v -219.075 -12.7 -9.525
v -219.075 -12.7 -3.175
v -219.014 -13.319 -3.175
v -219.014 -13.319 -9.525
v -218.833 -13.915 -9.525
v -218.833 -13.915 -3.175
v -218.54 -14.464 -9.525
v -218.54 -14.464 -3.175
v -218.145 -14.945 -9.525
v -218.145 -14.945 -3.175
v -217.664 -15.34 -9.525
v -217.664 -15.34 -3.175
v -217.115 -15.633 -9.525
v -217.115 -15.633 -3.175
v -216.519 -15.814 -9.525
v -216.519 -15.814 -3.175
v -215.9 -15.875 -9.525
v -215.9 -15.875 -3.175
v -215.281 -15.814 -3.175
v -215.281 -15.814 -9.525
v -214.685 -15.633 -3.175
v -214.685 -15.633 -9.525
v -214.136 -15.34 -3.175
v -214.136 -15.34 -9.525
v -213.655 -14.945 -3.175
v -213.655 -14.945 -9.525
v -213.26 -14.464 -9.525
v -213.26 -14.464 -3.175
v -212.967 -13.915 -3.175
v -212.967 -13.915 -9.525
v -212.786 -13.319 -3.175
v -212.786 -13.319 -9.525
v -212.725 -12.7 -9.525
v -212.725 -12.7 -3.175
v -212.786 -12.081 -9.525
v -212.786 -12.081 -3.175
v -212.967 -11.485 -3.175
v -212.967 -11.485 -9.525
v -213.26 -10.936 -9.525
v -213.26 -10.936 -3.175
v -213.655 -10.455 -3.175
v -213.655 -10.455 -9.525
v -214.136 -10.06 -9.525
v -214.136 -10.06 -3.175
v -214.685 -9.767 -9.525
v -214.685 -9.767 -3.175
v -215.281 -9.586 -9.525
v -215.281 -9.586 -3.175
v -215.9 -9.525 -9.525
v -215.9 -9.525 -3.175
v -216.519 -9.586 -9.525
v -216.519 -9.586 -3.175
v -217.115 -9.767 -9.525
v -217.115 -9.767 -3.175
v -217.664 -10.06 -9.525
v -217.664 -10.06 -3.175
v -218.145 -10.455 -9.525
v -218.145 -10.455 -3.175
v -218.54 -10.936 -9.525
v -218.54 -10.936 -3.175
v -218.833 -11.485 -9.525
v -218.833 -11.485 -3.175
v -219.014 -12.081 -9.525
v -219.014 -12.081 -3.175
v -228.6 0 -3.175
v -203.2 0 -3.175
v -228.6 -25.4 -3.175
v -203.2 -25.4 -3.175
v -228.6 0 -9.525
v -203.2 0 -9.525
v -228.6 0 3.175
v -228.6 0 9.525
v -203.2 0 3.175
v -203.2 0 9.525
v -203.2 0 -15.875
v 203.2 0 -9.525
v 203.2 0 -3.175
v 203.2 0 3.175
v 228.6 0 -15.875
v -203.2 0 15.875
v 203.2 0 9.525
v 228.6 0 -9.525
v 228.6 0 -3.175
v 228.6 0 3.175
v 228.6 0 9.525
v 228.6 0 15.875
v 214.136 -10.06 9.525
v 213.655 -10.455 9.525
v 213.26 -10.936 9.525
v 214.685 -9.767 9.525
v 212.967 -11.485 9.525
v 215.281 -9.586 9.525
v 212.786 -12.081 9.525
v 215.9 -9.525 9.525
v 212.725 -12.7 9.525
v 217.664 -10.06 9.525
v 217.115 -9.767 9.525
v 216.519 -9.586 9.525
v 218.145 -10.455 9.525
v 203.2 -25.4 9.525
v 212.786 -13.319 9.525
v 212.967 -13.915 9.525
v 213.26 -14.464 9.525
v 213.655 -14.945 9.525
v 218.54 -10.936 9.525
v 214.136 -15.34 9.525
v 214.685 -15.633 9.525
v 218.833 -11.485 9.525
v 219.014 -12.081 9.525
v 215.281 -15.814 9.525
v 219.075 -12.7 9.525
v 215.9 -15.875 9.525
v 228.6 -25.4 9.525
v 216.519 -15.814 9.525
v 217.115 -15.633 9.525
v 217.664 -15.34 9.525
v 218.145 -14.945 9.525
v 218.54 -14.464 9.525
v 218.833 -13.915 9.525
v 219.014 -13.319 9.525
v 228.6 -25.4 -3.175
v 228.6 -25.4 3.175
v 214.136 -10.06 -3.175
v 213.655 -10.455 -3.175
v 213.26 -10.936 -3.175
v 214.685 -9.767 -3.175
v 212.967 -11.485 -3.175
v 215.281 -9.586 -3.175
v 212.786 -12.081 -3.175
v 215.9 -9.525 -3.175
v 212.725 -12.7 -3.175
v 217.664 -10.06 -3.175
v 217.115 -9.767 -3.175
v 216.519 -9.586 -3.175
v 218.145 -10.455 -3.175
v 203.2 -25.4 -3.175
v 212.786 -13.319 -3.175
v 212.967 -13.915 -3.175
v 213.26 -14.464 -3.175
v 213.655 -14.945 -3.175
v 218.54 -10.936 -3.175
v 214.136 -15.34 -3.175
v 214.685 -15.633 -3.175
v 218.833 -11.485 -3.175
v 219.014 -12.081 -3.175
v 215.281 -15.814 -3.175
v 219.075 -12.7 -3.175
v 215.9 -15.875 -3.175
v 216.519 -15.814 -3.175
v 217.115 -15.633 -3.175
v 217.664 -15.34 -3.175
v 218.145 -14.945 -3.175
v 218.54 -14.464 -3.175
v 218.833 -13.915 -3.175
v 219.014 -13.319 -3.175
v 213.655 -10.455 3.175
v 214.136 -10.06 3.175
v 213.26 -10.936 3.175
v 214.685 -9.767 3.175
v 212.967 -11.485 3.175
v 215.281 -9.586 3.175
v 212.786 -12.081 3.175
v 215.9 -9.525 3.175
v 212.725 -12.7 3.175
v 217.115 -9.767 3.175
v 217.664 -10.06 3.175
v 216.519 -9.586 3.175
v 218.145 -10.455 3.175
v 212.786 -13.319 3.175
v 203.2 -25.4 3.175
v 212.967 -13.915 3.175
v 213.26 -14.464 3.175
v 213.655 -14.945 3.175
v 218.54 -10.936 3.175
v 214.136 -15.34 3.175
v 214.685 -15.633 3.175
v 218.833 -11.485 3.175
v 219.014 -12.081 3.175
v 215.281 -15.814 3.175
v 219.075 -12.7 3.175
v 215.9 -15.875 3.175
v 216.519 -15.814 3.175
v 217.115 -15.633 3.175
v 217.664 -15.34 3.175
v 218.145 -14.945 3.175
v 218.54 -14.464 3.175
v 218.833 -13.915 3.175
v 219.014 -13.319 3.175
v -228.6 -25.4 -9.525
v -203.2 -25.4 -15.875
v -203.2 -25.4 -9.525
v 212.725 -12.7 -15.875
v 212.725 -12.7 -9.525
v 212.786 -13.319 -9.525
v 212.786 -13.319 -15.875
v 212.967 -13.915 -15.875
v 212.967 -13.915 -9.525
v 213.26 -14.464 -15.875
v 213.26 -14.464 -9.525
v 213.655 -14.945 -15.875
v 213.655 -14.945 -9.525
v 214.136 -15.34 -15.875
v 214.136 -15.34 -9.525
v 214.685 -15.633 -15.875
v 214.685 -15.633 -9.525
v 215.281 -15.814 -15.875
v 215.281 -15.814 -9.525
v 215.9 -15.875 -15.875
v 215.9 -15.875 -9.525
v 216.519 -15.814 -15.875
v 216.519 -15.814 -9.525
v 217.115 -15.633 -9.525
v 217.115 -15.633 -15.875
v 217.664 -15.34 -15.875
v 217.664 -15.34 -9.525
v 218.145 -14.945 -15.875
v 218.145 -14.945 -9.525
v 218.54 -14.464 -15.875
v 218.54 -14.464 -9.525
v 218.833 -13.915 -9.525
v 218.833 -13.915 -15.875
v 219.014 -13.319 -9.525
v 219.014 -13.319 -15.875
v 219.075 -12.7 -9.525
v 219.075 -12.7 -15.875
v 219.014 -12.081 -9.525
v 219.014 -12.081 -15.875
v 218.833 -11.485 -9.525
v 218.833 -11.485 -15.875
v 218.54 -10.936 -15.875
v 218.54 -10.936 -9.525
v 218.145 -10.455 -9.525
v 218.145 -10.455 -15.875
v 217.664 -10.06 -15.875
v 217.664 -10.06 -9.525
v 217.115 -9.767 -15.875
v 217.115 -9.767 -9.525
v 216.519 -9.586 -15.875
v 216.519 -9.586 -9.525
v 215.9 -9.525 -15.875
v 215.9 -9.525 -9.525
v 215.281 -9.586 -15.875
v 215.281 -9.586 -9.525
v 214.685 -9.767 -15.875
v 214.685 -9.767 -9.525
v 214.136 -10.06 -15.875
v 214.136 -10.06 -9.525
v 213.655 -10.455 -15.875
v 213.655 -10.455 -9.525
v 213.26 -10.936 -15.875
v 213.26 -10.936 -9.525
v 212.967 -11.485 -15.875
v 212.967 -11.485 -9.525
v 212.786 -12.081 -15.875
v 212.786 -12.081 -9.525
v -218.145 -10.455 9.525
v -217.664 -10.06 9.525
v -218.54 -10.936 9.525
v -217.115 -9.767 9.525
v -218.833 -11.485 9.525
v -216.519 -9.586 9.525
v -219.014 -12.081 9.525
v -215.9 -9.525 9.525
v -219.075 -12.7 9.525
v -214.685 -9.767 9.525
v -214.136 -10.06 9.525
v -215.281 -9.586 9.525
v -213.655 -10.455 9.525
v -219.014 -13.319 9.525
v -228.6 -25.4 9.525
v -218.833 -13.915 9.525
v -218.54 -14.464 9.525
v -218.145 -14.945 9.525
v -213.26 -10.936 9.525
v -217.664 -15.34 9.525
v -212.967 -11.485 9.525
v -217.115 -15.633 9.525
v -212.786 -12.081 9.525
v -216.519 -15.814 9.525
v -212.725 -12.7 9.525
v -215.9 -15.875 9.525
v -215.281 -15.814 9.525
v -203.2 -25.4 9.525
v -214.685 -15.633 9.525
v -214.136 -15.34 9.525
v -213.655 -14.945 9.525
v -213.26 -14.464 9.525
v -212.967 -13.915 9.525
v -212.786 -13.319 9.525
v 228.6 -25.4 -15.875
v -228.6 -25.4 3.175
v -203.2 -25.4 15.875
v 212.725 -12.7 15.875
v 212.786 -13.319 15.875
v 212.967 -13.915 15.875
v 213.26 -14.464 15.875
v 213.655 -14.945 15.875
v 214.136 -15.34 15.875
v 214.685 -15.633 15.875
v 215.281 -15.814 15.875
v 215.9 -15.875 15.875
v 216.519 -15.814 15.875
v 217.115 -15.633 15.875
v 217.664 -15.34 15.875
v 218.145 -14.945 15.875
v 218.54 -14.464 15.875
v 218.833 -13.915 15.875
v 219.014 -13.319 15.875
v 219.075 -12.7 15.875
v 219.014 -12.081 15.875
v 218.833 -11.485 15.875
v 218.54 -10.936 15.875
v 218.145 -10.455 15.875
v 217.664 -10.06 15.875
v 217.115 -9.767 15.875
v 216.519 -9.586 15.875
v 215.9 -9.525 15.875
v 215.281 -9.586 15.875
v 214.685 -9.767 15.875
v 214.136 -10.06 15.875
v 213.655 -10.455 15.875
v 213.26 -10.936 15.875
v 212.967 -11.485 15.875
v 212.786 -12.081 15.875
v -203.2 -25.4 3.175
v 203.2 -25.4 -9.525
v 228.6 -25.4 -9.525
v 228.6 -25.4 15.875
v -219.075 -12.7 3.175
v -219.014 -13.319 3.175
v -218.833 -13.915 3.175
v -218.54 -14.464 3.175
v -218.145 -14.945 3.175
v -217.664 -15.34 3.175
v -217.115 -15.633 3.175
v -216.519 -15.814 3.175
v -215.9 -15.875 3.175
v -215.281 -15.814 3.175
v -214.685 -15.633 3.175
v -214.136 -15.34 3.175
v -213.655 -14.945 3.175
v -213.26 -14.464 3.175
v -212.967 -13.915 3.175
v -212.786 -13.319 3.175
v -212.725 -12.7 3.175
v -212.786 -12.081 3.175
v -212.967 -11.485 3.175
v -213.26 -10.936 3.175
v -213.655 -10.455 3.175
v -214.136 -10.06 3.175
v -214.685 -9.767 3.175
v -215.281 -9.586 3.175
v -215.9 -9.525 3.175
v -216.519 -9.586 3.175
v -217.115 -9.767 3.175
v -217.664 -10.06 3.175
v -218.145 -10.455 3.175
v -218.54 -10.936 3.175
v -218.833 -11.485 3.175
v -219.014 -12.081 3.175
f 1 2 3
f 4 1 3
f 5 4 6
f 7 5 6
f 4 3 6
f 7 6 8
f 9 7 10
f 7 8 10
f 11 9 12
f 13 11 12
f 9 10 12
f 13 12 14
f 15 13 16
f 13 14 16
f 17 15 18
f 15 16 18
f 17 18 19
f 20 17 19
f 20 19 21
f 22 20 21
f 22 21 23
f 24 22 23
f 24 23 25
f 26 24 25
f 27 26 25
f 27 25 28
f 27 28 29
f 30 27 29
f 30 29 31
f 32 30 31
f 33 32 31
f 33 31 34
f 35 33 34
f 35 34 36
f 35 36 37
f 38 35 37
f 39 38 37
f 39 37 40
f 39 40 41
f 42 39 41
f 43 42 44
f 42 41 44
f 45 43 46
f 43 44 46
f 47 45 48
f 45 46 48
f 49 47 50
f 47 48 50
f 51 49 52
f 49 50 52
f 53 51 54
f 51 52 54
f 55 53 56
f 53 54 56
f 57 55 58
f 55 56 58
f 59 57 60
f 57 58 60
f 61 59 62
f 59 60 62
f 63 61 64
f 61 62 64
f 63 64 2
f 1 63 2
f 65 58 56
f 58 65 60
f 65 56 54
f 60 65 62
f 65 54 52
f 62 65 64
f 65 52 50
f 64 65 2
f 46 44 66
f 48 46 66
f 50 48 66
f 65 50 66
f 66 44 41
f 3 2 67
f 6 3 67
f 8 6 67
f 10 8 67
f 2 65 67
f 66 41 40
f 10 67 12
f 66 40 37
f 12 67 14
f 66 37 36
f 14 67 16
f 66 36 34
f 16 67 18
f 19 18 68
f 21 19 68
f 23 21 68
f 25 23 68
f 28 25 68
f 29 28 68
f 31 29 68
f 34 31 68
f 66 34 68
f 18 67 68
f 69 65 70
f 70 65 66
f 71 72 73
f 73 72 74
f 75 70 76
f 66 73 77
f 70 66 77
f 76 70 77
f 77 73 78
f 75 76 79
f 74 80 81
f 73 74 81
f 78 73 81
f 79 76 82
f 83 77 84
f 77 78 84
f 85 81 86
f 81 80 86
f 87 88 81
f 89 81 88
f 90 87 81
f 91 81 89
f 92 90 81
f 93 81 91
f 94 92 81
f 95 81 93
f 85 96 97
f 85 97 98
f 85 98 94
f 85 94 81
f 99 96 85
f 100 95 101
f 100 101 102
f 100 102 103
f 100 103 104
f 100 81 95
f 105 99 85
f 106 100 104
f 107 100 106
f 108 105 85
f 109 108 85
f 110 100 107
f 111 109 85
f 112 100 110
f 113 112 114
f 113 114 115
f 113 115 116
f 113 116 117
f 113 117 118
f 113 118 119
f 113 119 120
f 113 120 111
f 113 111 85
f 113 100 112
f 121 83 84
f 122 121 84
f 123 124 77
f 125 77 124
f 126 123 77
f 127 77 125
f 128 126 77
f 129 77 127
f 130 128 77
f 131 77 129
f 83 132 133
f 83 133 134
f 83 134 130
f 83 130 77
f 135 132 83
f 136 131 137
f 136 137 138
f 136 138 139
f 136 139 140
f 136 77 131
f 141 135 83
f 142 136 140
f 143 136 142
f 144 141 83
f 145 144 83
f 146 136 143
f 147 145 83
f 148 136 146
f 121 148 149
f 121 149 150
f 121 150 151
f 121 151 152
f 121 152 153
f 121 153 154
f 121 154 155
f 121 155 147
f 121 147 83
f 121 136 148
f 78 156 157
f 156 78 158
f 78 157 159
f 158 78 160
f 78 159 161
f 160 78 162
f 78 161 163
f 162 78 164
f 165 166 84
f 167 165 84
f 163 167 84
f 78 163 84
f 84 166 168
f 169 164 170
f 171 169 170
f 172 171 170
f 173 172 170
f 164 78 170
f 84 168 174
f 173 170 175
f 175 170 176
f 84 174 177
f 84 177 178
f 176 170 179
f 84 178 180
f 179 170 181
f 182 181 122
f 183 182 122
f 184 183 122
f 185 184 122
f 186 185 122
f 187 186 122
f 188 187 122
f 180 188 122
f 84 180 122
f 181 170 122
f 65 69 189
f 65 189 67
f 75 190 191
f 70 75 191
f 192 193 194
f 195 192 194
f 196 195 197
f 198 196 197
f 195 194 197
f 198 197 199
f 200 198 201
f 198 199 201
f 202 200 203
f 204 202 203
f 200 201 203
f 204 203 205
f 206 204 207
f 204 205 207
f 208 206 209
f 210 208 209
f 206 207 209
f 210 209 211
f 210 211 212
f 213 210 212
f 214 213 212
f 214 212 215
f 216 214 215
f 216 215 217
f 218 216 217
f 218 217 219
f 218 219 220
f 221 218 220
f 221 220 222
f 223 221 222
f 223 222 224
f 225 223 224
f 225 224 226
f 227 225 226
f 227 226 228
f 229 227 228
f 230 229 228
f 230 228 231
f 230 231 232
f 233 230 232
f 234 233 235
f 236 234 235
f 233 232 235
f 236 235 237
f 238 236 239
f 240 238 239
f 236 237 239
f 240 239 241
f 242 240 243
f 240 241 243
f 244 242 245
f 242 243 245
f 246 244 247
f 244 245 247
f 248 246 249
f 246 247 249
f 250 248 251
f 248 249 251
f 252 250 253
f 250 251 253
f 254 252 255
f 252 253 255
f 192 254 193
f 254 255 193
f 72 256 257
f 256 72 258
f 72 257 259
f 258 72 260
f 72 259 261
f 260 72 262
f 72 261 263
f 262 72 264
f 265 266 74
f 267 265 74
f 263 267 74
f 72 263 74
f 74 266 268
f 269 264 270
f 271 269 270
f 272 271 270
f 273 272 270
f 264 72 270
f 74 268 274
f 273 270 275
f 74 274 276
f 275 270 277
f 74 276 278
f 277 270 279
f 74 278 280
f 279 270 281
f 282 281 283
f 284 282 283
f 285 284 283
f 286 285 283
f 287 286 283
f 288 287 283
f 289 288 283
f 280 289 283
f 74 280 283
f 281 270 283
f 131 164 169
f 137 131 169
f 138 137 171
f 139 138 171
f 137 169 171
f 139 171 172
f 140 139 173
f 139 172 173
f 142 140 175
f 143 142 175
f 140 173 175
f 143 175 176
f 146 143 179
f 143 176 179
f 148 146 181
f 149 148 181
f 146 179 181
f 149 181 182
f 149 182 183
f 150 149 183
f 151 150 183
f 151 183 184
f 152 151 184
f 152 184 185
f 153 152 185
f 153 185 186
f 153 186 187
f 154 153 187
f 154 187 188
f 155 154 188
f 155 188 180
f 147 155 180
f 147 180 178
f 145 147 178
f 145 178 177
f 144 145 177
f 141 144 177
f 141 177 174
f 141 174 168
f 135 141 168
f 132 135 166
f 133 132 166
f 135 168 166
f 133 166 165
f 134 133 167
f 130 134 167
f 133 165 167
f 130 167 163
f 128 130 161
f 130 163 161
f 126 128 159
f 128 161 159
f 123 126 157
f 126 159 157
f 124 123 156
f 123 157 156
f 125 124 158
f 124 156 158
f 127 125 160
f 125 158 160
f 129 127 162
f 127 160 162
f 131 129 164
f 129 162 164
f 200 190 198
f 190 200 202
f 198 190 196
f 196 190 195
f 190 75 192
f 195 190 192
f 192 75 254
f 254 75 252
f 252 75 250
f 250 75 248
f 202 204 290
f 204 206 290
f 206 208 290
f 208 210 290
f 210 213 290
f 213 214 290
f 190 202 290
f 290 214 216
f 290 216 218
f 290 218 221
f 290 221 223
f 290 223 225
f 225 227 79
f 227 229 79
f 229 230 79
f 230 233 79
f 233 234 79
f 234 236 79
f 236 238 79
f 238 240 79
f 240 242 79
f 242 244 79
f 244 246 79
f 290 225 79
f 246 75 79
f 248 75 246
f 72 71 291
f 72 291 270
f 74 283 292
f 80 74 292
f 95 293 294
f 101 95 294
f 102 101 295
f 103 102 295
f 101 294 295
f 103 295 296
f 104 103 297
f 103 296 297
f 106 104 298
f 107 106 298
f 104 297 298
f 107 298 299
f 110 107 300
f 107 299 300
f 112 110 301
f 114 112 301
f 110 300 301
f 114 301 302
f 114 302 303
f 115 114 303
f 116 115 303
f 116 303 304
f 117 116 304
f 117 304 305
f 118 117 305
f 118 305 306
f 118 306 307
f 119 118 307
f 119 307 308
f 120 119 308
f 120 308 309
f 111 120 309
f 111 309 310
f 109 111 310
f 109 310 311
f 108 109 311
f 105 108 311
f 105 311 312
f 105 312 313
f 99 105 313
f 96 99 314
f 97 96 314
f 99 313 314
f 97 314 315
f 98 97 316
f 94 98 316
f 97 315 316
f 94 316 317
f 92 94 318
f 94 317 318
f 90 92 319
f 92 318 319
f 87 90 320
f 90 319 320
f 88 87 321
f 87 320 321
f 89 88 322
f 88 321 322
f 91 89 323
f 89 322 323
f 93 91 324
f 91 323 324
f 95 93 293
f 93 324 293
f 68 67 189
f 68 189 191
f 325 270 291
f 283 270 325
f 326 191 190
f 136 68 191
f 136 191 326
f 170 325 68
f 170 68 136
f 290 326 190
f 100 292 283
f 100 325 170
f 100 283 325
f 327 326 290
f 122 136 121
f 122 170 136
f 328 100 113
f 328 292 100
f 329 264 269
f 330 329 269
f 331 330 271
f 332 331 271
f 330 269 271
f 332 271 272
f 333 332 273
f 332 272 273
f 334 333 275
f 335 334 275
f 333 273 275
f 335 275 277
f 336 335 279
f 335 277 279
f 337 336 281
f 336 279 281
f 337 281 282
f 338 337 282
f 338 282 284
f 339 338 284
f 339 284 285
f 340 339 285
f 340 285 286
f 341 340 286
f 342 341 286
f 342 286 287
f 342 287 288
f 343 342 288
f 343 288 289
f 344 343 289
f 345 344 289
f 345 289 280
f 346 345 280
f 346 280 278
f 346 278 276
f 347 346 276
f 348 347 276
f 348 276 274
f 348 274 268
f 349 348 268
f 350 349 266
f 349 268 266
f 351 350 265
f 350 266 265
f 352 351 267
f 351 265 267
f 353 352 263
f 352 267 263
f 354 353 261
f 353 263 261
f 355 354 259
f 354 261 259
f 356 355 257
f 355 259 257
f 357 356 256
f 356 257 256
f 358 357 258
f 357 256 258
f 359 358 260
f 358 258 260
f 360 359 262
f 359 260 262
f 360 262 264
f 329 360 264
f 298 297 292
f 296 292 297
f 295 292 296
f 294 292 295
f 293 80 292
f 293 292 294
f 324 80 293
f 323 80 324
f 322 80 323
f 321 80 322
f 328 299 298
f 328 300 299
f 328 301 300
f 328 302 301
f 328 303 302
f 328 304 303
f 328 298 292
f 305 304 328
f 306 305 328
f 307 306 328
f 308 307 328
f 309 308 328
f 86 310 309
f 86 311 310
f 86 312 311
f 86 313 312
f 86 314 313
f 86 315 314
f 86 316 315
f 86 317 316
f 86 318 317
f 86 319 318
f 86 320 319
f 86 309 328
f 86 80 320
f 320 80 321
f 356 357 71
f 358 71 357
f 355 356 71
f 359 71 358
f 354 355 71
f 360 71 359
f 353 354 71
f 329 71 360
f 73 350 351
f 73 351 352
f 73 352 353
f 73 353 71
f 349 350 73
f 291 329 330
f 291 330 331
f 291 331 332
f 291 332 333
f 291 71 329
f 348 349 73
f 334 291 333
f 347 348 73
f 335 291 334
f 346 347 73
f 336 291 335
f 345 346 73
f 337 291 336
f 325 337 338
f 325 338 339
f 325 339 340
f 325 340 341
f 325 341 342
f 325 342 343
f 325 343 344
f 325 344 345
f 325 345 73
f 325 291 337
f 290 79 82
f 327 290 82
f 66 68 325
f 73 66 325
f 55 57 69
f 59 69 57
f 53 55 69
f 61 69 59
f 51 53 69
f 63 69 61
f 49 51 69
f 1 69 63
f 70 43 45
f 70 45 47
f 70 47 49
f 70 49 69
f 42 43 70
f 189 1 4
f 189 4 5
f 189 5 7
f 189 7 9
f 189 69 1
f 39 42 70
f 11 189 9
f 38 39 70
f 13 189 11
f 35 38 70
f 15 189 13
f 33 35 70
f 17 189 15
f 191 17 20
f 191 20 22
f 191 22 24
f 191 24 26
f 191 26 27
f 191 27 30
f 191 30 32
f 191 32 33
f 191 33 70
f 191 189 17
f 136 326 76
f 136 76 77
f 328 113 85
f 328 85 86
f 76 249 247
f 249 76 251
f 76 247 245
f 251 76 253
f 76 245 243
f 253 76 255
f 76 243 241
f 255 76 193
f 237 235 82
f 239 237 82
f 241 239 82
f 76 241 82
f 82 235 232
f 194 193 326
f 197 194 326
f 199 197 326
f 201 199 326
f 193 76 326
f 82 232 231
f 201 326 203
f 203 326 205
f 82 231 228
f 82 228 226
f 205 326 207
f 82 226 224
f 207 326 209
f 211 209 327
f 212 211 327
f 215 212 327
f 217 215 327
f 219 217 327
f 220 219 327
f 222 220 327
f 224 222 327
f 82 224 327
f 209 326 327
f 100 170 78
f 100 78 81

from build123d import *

# Parameters (mm, degrees)
SKETCH_W        = 457.2
SKETCH_H        = 31.75
PAD_DEPTH       = 25.4
SKETCH001_W     = 25.4
SKETCH001_H     = 6.35
POCKET_DEPTH    = 25.401
SKETCH002_W     = 25.4
SKETCH002_H     = 6.35
POCKET001_DEPTH = 25.401
SKETCH003_R     = 3.175
POCKET002_DEPTH = 31.751


with BuildPart() as part:
    # Sketch → Pad (new body)
    with BuildSketch(Plane.XZ):
        Rectangle(SKETCH_W, SKETCH_H)
    extrude(amount=PAD_DEPTH)

    # Sketch001 (on Face6 of Pad) → Pocket (cut, through all)
    with BuildSketch(Plane.XZ.offset(25.4)):
        with Locations((-215.9, 12.7)):
            Rectangle(SKETCH001_W, SKETCH001_H)
        with Locations((-215.9, 0)):
            Rectangle(SKETCH001_W, SKETCH001_H)
        with Locations((-215.9, -12.7)):
            Rectangle(SKETCH001_W, SKETCH001_H)
    extrude(amount=-POCKET_DEPTH, mode=Mode.SUBTRACT)

    # Sketch002 (on Face6 of Pad) → Pocket001 (cut, through all)
    with BuildSketch(Plane.XZ.offset(25.4)):
        with Locations((215.9, 6.35)):
            Rectangle(SKETCH002_W, SKETCH002_H)
        with Locations((215.9, -6.35)):
            Rectangle(SKETCH002_W, SKETCH002_H)
    extrude(amount=-POCKET001_DEPTH, mode=Mode.SUBTRACT)

    # Sketch003 (on Face21 of Pocket001) → Pocket002 (cut, through all)
    with BuildSketch(Plane(origin=(0, 0, 15.875), x_dir=(-1, 0, 0), z_dir=(0, 0, 1))):
        with Locations((215.9, 12.7)):
            Circle(SKETCH003_R)
        with Locations((-215.9, 12.7)):
            Circle(SKETCH003_R)
    extrude(amount=-POCKET002_DEPTH, mode=Mode.SUBTRACT)


solid = part.part
